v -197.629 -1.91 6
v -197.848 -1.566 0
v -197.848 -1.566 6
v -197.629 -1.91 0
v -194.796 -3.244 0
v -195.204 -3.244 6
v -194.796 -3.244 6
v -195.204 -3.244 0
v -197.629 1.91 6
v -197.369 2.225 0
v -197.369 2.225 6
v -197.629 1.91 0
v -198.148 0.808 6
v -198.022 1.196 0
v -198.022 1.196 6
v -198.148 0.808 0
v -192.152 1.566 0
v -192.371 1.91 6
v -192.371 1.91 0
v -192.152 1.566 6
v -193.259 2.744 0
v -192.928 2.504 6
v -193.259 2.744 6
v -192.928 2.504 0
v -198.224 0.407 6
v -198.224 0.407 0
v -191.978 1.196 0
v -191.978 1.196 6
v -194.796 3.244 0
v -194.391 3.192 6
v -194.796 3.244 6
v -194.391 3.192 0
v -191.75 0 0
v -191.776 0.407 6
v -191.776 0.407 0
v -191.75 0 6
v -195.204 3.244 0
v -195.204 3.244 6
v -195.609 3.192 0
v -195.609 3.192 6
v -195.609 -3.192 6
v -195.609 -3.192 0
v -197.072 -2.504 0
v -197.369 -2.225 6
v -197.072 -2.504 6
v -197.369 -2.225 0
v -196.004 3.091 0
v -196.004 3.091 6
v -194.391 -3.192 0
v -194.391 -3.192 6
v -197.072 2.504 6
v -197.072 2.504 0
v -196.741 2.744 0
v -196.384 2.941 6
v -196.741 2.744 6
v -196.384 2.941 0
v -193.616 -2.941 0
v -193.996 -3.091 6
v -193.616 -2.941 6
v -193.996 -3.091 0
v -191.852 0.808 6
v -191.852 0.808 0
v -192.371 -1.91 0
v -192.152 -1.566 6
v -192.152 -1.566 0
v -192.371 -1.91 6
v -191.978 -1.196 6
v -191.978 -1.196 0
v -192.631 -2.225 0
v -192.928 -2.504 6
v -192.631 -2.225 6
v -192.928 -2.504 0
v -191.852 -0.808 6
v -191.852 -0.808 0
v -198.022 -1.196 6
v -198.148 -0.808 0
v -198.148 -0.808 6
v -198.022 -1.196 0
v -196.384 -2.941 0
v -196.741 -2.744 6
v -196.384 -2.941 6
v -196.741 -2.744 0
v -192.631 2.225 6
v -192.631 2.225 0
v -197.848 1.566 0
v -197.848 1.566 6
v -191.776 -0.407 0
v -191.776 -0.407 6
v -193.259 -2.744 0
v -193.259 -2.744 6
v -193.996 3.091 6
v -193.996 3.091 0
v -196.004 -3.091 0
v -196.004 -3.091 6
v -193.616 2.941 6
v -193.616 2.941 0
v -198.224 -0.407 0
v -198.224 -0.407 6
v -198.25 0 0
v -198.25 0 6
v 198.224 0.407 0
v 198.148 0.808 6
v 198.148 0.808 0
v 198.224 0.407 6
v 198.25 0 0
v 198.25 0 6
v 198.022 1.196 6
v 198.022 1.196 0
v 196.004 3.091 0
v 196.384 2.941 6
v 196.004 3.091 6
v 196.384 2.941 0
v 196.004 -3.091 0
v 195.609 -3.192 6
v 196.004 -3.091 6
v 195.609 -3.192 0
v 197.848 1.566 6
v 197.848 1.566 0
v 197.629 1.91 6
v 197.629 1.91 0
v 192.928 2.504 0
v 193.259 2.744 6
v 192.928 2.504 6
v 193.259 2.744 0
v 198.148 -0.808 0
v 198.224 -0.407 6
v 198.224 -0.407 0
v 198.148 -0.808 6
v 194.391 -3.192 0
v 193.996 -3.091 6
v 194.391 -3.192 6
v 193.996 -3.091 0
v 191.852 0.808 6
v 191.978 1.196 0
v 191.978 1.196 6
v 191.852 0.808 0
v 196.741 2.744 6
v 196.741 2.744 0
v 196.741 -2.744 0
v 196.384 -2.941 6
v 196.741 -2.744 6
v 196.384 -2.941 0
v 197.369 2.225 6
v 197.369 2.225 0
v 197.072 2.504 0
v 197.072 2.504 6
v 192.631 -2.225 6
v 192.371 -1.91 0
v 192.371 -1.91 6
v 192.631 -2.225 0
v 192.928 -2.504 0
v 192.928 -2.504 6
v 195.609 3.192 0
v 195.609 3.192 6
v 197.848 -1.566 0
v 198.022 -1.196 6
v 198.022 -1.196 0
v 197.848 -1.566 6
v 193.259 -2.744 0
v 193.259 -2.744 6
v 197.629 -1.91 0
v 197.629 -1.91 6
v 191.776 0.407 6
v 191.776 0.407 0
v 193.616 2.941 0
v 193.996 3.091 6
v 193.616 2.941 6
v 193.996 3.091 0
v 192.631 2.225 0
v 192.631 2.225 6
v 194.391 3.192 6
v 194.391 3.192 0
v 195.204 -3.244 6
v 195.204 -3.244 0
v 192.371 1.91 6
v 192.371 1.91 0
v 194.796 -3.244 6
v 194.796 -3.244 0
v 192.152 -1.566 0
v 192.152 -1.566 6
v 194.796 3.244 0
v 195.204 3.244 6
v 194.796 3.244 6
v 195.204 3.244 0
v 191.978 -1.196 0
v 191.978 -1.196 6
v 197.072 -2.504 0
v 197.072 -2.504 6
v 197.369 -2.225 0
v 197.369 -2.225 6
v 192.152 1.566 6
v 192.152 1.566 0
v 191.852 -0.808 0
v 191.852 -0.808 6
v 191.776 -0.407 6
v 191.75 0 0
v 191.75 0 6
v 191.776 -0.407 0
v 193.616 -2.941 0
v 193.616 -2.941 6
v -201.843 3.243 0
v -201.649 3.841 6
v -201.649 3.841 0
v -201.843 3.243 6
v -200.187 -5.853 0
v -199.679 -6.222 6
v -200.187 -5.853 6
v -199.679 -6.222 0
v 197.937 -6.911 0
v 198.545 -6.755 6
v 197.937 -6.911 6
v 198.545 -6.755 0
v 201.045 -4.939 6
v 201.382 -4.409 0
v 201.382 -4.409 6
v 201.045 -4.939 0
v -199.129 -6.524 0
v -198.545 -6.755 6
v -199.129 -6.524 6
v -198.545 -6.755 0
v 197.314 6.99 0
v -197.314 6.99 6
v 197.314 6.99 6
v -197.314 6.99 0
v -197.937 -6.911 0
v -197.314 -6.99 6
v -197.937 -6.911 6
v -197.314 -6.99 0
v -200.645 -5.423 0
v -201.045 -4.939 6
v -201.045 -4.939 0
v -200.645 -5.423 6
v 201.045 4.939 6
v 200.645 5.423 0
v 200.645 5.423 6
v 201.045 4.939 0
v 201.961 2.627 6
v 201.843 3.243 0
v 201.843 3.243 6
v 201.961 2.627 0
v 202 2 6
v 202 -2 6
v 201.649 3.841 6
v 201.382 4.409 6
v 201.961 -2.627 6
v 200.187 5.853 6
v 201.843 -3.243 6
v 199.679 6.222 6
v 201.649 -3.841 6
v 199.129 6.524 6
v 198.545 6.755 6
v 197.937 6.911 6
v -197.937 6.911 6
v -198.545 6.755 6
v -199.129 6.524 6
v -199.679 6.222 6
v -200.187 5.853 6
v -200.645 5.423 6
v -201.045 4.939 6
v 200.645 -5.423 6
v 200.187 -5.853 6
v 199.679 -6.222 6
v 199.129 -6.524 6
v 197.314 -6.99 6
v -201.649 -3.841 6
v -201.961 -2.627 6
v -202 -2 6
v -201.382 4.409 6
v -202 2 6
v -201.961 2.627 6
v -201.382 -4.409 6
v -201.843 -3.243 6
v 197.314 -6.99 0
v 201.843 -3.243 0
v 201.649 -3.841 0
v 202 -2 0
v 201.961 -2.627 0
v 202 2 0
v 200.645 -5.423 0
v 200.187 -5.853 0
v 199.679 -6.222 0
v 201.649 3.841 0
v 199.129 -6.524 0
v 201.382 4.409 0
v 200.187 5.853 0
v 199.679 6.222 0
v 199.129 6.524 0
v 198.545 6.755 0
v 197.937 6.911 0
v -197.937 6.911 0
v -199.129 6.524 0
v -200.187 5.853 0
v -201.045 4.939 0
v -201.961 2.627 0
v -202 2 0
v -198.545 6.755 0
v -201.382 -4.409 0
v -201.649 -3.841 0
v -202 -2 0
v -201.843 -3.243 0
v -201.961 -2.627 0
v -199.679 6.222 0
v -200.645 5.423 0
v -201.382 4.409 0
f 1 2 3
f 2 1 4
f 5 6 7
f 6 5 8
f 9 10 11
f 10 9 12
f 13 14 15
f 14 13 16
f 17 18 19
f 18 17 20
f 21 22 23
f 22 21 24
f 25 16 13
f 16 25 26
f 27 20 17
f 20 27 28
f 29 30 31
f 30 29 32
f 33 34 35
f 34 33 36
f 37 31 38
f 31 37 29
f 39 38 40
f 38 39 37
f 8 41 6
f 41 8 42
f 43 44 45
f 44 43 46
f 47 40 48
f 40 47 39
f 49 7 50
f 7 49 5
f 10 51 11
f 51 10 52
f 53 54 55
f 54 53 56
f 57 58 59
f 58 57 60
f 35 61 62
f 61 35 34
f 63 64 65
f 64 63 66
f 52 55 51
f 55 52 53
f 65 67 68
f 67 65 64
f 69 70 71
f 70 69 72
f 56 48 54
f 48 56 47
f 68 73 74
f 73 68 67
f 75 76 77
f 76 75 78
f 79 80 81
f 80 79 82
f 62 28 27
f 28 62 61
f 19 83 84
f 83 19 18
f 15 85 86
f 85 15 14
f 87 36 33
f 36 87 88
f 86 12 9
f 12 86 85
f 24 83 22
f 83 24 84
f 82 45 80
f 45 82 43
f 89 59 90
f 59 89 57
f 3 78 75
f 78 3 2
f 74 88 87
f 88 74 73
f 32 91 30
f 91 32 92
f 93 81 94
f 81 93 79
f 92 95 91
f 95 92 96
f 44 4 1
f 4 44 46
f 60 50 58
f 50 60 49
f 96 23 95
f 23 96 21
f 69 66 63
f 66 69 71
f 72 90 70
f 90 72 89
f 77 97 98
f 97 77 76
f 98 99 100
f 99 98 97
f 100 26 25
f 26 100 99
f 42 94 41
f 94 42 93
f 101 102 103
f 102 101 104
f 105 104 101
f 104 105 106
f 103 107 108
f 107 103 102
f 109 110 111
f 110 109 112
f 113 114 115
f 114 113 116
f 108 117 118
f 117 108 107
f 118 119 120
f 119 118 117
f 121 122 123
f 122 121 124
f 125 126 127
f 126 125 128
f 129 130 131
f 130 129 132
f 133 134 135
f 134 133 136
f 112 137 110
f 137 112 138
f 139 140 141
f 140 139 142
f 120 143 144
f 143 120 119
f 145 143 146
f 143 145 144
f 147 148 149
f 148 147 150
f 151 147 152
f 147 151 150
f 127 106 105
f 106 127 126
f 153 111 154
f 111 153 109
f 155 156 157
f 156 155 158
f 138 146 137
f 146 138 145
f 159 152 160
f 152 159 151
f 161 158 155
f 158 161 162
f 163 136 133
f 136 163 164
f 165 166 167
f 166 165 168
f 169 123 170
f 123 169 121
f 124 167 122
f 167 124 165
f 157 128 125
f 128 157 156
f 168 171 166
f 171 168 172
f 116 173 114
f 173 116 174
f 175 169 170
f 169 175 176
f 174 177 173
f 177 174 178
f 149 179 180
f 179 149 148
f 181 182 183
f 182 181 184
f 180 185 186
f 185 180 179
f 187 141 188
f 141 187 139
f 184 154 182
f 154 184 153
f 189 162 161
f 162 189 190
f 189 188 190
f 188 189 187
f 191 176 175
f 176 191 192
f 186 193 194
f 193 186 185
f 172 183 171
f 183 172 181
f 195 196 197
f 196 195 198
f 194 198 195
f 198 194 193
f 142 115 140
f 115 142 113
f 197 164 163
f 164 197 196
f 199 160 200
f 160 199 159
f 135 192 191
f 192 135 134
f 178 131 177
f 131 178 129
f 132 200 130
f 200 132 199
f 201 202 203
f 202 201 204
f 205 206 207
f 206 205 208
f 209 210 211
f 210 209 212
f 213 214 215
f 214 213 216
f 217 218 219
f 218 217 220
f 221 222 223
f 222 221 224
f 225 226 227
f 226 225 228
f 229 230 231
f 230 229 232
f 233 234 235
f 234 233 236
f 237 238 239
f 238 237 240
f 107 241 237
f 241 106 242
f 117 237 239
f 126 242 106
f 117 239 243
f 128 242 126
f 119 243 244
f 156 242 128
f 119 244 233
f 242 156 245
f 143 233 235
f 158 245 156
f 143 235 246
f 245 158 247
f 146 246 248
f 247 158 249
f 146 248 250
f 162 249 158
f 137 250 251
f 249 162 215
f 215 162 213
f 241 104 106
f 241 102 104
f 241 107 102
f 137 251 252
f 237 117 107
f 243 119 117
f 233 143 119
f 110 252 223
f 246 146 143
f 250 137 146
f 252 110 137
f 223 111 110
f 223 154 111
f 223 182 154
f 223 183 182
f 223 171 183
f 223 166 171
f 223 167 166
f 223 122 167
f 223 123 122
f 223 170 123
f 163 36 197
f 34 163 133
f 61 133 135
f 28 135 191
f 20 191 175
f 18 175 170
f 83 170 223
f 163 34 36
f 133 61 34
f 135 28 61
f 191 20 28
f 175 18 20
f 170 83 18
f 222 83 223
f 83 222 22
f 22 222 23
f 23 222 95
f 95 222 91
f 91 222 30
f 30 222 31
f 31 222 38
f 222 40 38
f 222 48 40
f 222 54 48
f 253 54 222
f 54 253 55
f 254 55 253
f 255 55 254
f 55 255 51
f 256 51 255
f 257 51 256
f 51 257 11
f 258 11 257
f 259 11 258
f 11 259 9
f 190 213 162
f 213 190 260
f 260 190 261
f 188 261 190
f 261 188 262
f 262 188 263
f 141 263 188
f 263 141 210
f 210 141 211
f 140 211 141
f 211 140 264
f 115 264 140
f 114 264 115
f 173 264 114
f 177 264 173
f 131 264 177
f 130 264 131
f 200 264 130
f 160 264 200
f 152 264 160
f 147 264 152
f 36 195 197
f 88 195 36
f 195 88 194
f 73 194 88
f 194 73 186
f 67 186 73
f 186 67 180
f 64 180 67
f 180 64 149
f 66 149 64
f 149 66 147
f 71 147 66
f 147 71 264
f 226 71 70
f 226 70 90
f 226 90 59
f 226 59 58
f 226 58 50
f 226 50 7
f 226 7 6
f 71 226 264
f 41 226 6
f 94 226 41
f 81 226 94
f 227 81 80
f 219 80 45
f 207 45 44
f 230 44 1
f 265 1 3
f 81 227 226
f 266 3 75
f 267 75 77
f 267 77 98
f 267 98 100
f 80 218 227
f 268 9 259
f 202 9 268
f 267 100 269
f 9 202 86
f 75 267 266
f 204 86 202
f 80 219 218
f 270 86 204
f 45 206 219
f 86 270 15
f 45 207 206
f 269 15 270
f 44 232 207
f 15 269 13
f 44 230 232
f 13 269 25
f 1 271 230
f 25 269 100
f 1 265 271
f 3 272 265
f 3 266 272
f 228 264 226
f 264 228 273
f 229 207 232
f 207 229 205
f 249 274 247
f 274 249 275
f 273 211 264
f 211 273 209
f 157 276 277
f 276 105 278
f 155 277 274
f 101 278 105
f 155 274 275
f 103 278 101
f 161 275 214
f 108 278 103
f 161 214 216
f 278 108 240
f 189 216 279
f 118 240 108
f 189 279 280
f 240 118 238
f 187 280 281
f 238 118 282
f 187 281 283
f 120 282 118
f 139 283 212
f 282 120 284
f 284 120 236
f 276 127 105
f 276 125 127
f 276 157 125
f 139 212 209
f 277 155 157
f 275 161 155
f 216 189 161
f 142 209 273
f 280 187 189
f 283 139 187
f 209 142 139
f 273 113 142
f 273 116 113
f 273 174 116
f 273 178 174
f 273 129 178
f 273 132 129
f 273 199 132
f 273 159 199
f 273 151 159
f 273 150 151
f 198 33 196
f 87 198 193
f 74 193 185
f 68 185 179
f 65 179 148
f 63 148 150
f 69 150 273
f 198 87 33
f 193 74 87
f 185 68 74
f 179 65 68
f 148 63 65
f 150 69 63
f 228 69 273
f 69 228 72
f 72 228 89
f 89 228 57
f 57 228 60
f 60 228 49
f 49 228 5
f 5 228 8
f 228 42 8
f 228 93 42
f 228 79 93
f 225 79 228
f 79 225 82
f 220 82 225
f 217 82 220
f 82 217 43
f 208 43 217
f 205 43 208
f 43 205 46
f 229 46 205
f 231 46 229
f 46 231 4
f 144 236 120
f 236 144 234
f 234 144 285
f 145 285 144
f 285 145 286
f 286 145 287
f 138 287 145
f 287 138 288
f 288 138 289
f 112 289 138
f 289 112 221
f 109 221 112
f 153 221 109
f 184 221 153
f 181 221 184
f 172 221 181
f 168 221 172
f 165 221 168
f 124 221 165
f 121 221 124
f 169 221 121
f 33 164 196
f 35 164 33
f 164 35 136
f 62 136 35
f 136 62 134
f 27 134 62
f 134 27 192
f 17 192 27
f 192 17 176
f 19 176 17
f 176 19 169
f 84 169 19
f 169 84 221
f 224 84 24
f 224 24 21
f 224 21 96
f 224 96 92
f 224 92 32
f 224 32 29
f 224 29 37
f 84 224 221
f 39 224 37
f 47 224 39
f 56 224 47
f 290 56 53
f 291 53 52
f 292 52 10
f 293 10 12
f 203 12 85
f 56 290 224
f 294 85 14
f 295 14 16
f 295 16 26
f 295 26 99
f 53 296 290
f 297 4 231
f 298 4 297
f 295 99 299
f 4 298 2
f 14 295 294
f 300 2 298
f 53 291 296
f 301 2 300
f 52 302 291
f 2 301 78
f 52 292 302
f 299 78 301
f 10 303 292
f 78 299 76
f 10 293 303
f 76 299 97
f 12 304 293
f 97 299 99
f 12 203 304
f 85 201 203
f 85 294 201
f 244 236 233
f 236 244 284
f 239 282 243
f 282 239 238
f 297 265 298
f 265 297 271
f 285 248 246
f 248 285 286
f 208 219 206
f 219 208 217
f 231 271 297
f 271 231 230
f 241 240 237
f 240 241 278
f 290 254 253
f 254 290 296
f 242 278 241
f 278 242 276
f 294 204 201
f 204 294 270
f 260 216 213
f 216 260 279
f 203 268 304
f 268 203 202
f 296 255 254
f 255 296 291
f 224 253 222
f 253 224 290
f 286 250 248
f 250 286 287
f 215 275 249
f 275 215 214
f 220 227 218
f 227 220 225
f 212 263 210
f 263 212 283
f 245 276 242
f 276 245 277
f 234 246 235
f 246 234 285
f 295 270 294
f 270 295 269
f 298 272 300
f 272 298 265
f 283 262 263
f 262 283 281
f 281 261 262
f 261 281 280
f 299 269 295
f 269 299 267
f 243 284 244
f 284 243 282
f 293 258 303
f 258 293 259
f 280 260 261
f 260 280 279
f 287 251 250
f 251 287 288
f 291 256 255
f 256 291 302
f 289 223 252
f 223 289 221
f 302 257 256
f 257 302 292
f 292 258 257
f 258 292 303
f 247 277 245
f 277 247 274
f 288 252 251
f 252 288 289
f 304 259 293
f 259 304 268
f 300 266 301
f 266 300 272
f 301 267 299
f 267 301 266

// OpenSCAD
$fn = 50;


difference() {
	union() {
		hull() {
			translate(v = [-197.0000000000, 2.0000000000, 0]) {
				cylinder(h = 6, r = 5);
			}
			translate(v = [197.0000000000, 2.0000000000, 0]) {
				cylinder(h = 6, r = 5);
			}
			translate(v = [-197.0000000000, -2.0000000000, 0]) {
				cylinder(h = 6, r = 5);
			}
			translate(v = [197.0000000000, -2.0000000000, 0]) {
				cylinder(h = 6, r = 5);
			}
		}
	}
	union() {
		translate(v = [-195.0000000000, 0.0000000000, -100.0000000000]) {
			cylinder(h = 200, r = 3.2500000000);
		}
		translate(v = [-195.0000000000, 0.0000000000, -100.0000000000]) {
			cylinder(h = 200, r = 3.2500000000);
		}
		translate(v = [195.0000000000, 0.0000000000, -100.0000000000]) {
			cylinder(h = 200, r = 3.2500000000);
		}
		translate(v = [195.0000000000, 0.0000000000, -100.0000000000]) {
			cylinder(h = 200, r = 3.2500000000);
		}
	}
}
